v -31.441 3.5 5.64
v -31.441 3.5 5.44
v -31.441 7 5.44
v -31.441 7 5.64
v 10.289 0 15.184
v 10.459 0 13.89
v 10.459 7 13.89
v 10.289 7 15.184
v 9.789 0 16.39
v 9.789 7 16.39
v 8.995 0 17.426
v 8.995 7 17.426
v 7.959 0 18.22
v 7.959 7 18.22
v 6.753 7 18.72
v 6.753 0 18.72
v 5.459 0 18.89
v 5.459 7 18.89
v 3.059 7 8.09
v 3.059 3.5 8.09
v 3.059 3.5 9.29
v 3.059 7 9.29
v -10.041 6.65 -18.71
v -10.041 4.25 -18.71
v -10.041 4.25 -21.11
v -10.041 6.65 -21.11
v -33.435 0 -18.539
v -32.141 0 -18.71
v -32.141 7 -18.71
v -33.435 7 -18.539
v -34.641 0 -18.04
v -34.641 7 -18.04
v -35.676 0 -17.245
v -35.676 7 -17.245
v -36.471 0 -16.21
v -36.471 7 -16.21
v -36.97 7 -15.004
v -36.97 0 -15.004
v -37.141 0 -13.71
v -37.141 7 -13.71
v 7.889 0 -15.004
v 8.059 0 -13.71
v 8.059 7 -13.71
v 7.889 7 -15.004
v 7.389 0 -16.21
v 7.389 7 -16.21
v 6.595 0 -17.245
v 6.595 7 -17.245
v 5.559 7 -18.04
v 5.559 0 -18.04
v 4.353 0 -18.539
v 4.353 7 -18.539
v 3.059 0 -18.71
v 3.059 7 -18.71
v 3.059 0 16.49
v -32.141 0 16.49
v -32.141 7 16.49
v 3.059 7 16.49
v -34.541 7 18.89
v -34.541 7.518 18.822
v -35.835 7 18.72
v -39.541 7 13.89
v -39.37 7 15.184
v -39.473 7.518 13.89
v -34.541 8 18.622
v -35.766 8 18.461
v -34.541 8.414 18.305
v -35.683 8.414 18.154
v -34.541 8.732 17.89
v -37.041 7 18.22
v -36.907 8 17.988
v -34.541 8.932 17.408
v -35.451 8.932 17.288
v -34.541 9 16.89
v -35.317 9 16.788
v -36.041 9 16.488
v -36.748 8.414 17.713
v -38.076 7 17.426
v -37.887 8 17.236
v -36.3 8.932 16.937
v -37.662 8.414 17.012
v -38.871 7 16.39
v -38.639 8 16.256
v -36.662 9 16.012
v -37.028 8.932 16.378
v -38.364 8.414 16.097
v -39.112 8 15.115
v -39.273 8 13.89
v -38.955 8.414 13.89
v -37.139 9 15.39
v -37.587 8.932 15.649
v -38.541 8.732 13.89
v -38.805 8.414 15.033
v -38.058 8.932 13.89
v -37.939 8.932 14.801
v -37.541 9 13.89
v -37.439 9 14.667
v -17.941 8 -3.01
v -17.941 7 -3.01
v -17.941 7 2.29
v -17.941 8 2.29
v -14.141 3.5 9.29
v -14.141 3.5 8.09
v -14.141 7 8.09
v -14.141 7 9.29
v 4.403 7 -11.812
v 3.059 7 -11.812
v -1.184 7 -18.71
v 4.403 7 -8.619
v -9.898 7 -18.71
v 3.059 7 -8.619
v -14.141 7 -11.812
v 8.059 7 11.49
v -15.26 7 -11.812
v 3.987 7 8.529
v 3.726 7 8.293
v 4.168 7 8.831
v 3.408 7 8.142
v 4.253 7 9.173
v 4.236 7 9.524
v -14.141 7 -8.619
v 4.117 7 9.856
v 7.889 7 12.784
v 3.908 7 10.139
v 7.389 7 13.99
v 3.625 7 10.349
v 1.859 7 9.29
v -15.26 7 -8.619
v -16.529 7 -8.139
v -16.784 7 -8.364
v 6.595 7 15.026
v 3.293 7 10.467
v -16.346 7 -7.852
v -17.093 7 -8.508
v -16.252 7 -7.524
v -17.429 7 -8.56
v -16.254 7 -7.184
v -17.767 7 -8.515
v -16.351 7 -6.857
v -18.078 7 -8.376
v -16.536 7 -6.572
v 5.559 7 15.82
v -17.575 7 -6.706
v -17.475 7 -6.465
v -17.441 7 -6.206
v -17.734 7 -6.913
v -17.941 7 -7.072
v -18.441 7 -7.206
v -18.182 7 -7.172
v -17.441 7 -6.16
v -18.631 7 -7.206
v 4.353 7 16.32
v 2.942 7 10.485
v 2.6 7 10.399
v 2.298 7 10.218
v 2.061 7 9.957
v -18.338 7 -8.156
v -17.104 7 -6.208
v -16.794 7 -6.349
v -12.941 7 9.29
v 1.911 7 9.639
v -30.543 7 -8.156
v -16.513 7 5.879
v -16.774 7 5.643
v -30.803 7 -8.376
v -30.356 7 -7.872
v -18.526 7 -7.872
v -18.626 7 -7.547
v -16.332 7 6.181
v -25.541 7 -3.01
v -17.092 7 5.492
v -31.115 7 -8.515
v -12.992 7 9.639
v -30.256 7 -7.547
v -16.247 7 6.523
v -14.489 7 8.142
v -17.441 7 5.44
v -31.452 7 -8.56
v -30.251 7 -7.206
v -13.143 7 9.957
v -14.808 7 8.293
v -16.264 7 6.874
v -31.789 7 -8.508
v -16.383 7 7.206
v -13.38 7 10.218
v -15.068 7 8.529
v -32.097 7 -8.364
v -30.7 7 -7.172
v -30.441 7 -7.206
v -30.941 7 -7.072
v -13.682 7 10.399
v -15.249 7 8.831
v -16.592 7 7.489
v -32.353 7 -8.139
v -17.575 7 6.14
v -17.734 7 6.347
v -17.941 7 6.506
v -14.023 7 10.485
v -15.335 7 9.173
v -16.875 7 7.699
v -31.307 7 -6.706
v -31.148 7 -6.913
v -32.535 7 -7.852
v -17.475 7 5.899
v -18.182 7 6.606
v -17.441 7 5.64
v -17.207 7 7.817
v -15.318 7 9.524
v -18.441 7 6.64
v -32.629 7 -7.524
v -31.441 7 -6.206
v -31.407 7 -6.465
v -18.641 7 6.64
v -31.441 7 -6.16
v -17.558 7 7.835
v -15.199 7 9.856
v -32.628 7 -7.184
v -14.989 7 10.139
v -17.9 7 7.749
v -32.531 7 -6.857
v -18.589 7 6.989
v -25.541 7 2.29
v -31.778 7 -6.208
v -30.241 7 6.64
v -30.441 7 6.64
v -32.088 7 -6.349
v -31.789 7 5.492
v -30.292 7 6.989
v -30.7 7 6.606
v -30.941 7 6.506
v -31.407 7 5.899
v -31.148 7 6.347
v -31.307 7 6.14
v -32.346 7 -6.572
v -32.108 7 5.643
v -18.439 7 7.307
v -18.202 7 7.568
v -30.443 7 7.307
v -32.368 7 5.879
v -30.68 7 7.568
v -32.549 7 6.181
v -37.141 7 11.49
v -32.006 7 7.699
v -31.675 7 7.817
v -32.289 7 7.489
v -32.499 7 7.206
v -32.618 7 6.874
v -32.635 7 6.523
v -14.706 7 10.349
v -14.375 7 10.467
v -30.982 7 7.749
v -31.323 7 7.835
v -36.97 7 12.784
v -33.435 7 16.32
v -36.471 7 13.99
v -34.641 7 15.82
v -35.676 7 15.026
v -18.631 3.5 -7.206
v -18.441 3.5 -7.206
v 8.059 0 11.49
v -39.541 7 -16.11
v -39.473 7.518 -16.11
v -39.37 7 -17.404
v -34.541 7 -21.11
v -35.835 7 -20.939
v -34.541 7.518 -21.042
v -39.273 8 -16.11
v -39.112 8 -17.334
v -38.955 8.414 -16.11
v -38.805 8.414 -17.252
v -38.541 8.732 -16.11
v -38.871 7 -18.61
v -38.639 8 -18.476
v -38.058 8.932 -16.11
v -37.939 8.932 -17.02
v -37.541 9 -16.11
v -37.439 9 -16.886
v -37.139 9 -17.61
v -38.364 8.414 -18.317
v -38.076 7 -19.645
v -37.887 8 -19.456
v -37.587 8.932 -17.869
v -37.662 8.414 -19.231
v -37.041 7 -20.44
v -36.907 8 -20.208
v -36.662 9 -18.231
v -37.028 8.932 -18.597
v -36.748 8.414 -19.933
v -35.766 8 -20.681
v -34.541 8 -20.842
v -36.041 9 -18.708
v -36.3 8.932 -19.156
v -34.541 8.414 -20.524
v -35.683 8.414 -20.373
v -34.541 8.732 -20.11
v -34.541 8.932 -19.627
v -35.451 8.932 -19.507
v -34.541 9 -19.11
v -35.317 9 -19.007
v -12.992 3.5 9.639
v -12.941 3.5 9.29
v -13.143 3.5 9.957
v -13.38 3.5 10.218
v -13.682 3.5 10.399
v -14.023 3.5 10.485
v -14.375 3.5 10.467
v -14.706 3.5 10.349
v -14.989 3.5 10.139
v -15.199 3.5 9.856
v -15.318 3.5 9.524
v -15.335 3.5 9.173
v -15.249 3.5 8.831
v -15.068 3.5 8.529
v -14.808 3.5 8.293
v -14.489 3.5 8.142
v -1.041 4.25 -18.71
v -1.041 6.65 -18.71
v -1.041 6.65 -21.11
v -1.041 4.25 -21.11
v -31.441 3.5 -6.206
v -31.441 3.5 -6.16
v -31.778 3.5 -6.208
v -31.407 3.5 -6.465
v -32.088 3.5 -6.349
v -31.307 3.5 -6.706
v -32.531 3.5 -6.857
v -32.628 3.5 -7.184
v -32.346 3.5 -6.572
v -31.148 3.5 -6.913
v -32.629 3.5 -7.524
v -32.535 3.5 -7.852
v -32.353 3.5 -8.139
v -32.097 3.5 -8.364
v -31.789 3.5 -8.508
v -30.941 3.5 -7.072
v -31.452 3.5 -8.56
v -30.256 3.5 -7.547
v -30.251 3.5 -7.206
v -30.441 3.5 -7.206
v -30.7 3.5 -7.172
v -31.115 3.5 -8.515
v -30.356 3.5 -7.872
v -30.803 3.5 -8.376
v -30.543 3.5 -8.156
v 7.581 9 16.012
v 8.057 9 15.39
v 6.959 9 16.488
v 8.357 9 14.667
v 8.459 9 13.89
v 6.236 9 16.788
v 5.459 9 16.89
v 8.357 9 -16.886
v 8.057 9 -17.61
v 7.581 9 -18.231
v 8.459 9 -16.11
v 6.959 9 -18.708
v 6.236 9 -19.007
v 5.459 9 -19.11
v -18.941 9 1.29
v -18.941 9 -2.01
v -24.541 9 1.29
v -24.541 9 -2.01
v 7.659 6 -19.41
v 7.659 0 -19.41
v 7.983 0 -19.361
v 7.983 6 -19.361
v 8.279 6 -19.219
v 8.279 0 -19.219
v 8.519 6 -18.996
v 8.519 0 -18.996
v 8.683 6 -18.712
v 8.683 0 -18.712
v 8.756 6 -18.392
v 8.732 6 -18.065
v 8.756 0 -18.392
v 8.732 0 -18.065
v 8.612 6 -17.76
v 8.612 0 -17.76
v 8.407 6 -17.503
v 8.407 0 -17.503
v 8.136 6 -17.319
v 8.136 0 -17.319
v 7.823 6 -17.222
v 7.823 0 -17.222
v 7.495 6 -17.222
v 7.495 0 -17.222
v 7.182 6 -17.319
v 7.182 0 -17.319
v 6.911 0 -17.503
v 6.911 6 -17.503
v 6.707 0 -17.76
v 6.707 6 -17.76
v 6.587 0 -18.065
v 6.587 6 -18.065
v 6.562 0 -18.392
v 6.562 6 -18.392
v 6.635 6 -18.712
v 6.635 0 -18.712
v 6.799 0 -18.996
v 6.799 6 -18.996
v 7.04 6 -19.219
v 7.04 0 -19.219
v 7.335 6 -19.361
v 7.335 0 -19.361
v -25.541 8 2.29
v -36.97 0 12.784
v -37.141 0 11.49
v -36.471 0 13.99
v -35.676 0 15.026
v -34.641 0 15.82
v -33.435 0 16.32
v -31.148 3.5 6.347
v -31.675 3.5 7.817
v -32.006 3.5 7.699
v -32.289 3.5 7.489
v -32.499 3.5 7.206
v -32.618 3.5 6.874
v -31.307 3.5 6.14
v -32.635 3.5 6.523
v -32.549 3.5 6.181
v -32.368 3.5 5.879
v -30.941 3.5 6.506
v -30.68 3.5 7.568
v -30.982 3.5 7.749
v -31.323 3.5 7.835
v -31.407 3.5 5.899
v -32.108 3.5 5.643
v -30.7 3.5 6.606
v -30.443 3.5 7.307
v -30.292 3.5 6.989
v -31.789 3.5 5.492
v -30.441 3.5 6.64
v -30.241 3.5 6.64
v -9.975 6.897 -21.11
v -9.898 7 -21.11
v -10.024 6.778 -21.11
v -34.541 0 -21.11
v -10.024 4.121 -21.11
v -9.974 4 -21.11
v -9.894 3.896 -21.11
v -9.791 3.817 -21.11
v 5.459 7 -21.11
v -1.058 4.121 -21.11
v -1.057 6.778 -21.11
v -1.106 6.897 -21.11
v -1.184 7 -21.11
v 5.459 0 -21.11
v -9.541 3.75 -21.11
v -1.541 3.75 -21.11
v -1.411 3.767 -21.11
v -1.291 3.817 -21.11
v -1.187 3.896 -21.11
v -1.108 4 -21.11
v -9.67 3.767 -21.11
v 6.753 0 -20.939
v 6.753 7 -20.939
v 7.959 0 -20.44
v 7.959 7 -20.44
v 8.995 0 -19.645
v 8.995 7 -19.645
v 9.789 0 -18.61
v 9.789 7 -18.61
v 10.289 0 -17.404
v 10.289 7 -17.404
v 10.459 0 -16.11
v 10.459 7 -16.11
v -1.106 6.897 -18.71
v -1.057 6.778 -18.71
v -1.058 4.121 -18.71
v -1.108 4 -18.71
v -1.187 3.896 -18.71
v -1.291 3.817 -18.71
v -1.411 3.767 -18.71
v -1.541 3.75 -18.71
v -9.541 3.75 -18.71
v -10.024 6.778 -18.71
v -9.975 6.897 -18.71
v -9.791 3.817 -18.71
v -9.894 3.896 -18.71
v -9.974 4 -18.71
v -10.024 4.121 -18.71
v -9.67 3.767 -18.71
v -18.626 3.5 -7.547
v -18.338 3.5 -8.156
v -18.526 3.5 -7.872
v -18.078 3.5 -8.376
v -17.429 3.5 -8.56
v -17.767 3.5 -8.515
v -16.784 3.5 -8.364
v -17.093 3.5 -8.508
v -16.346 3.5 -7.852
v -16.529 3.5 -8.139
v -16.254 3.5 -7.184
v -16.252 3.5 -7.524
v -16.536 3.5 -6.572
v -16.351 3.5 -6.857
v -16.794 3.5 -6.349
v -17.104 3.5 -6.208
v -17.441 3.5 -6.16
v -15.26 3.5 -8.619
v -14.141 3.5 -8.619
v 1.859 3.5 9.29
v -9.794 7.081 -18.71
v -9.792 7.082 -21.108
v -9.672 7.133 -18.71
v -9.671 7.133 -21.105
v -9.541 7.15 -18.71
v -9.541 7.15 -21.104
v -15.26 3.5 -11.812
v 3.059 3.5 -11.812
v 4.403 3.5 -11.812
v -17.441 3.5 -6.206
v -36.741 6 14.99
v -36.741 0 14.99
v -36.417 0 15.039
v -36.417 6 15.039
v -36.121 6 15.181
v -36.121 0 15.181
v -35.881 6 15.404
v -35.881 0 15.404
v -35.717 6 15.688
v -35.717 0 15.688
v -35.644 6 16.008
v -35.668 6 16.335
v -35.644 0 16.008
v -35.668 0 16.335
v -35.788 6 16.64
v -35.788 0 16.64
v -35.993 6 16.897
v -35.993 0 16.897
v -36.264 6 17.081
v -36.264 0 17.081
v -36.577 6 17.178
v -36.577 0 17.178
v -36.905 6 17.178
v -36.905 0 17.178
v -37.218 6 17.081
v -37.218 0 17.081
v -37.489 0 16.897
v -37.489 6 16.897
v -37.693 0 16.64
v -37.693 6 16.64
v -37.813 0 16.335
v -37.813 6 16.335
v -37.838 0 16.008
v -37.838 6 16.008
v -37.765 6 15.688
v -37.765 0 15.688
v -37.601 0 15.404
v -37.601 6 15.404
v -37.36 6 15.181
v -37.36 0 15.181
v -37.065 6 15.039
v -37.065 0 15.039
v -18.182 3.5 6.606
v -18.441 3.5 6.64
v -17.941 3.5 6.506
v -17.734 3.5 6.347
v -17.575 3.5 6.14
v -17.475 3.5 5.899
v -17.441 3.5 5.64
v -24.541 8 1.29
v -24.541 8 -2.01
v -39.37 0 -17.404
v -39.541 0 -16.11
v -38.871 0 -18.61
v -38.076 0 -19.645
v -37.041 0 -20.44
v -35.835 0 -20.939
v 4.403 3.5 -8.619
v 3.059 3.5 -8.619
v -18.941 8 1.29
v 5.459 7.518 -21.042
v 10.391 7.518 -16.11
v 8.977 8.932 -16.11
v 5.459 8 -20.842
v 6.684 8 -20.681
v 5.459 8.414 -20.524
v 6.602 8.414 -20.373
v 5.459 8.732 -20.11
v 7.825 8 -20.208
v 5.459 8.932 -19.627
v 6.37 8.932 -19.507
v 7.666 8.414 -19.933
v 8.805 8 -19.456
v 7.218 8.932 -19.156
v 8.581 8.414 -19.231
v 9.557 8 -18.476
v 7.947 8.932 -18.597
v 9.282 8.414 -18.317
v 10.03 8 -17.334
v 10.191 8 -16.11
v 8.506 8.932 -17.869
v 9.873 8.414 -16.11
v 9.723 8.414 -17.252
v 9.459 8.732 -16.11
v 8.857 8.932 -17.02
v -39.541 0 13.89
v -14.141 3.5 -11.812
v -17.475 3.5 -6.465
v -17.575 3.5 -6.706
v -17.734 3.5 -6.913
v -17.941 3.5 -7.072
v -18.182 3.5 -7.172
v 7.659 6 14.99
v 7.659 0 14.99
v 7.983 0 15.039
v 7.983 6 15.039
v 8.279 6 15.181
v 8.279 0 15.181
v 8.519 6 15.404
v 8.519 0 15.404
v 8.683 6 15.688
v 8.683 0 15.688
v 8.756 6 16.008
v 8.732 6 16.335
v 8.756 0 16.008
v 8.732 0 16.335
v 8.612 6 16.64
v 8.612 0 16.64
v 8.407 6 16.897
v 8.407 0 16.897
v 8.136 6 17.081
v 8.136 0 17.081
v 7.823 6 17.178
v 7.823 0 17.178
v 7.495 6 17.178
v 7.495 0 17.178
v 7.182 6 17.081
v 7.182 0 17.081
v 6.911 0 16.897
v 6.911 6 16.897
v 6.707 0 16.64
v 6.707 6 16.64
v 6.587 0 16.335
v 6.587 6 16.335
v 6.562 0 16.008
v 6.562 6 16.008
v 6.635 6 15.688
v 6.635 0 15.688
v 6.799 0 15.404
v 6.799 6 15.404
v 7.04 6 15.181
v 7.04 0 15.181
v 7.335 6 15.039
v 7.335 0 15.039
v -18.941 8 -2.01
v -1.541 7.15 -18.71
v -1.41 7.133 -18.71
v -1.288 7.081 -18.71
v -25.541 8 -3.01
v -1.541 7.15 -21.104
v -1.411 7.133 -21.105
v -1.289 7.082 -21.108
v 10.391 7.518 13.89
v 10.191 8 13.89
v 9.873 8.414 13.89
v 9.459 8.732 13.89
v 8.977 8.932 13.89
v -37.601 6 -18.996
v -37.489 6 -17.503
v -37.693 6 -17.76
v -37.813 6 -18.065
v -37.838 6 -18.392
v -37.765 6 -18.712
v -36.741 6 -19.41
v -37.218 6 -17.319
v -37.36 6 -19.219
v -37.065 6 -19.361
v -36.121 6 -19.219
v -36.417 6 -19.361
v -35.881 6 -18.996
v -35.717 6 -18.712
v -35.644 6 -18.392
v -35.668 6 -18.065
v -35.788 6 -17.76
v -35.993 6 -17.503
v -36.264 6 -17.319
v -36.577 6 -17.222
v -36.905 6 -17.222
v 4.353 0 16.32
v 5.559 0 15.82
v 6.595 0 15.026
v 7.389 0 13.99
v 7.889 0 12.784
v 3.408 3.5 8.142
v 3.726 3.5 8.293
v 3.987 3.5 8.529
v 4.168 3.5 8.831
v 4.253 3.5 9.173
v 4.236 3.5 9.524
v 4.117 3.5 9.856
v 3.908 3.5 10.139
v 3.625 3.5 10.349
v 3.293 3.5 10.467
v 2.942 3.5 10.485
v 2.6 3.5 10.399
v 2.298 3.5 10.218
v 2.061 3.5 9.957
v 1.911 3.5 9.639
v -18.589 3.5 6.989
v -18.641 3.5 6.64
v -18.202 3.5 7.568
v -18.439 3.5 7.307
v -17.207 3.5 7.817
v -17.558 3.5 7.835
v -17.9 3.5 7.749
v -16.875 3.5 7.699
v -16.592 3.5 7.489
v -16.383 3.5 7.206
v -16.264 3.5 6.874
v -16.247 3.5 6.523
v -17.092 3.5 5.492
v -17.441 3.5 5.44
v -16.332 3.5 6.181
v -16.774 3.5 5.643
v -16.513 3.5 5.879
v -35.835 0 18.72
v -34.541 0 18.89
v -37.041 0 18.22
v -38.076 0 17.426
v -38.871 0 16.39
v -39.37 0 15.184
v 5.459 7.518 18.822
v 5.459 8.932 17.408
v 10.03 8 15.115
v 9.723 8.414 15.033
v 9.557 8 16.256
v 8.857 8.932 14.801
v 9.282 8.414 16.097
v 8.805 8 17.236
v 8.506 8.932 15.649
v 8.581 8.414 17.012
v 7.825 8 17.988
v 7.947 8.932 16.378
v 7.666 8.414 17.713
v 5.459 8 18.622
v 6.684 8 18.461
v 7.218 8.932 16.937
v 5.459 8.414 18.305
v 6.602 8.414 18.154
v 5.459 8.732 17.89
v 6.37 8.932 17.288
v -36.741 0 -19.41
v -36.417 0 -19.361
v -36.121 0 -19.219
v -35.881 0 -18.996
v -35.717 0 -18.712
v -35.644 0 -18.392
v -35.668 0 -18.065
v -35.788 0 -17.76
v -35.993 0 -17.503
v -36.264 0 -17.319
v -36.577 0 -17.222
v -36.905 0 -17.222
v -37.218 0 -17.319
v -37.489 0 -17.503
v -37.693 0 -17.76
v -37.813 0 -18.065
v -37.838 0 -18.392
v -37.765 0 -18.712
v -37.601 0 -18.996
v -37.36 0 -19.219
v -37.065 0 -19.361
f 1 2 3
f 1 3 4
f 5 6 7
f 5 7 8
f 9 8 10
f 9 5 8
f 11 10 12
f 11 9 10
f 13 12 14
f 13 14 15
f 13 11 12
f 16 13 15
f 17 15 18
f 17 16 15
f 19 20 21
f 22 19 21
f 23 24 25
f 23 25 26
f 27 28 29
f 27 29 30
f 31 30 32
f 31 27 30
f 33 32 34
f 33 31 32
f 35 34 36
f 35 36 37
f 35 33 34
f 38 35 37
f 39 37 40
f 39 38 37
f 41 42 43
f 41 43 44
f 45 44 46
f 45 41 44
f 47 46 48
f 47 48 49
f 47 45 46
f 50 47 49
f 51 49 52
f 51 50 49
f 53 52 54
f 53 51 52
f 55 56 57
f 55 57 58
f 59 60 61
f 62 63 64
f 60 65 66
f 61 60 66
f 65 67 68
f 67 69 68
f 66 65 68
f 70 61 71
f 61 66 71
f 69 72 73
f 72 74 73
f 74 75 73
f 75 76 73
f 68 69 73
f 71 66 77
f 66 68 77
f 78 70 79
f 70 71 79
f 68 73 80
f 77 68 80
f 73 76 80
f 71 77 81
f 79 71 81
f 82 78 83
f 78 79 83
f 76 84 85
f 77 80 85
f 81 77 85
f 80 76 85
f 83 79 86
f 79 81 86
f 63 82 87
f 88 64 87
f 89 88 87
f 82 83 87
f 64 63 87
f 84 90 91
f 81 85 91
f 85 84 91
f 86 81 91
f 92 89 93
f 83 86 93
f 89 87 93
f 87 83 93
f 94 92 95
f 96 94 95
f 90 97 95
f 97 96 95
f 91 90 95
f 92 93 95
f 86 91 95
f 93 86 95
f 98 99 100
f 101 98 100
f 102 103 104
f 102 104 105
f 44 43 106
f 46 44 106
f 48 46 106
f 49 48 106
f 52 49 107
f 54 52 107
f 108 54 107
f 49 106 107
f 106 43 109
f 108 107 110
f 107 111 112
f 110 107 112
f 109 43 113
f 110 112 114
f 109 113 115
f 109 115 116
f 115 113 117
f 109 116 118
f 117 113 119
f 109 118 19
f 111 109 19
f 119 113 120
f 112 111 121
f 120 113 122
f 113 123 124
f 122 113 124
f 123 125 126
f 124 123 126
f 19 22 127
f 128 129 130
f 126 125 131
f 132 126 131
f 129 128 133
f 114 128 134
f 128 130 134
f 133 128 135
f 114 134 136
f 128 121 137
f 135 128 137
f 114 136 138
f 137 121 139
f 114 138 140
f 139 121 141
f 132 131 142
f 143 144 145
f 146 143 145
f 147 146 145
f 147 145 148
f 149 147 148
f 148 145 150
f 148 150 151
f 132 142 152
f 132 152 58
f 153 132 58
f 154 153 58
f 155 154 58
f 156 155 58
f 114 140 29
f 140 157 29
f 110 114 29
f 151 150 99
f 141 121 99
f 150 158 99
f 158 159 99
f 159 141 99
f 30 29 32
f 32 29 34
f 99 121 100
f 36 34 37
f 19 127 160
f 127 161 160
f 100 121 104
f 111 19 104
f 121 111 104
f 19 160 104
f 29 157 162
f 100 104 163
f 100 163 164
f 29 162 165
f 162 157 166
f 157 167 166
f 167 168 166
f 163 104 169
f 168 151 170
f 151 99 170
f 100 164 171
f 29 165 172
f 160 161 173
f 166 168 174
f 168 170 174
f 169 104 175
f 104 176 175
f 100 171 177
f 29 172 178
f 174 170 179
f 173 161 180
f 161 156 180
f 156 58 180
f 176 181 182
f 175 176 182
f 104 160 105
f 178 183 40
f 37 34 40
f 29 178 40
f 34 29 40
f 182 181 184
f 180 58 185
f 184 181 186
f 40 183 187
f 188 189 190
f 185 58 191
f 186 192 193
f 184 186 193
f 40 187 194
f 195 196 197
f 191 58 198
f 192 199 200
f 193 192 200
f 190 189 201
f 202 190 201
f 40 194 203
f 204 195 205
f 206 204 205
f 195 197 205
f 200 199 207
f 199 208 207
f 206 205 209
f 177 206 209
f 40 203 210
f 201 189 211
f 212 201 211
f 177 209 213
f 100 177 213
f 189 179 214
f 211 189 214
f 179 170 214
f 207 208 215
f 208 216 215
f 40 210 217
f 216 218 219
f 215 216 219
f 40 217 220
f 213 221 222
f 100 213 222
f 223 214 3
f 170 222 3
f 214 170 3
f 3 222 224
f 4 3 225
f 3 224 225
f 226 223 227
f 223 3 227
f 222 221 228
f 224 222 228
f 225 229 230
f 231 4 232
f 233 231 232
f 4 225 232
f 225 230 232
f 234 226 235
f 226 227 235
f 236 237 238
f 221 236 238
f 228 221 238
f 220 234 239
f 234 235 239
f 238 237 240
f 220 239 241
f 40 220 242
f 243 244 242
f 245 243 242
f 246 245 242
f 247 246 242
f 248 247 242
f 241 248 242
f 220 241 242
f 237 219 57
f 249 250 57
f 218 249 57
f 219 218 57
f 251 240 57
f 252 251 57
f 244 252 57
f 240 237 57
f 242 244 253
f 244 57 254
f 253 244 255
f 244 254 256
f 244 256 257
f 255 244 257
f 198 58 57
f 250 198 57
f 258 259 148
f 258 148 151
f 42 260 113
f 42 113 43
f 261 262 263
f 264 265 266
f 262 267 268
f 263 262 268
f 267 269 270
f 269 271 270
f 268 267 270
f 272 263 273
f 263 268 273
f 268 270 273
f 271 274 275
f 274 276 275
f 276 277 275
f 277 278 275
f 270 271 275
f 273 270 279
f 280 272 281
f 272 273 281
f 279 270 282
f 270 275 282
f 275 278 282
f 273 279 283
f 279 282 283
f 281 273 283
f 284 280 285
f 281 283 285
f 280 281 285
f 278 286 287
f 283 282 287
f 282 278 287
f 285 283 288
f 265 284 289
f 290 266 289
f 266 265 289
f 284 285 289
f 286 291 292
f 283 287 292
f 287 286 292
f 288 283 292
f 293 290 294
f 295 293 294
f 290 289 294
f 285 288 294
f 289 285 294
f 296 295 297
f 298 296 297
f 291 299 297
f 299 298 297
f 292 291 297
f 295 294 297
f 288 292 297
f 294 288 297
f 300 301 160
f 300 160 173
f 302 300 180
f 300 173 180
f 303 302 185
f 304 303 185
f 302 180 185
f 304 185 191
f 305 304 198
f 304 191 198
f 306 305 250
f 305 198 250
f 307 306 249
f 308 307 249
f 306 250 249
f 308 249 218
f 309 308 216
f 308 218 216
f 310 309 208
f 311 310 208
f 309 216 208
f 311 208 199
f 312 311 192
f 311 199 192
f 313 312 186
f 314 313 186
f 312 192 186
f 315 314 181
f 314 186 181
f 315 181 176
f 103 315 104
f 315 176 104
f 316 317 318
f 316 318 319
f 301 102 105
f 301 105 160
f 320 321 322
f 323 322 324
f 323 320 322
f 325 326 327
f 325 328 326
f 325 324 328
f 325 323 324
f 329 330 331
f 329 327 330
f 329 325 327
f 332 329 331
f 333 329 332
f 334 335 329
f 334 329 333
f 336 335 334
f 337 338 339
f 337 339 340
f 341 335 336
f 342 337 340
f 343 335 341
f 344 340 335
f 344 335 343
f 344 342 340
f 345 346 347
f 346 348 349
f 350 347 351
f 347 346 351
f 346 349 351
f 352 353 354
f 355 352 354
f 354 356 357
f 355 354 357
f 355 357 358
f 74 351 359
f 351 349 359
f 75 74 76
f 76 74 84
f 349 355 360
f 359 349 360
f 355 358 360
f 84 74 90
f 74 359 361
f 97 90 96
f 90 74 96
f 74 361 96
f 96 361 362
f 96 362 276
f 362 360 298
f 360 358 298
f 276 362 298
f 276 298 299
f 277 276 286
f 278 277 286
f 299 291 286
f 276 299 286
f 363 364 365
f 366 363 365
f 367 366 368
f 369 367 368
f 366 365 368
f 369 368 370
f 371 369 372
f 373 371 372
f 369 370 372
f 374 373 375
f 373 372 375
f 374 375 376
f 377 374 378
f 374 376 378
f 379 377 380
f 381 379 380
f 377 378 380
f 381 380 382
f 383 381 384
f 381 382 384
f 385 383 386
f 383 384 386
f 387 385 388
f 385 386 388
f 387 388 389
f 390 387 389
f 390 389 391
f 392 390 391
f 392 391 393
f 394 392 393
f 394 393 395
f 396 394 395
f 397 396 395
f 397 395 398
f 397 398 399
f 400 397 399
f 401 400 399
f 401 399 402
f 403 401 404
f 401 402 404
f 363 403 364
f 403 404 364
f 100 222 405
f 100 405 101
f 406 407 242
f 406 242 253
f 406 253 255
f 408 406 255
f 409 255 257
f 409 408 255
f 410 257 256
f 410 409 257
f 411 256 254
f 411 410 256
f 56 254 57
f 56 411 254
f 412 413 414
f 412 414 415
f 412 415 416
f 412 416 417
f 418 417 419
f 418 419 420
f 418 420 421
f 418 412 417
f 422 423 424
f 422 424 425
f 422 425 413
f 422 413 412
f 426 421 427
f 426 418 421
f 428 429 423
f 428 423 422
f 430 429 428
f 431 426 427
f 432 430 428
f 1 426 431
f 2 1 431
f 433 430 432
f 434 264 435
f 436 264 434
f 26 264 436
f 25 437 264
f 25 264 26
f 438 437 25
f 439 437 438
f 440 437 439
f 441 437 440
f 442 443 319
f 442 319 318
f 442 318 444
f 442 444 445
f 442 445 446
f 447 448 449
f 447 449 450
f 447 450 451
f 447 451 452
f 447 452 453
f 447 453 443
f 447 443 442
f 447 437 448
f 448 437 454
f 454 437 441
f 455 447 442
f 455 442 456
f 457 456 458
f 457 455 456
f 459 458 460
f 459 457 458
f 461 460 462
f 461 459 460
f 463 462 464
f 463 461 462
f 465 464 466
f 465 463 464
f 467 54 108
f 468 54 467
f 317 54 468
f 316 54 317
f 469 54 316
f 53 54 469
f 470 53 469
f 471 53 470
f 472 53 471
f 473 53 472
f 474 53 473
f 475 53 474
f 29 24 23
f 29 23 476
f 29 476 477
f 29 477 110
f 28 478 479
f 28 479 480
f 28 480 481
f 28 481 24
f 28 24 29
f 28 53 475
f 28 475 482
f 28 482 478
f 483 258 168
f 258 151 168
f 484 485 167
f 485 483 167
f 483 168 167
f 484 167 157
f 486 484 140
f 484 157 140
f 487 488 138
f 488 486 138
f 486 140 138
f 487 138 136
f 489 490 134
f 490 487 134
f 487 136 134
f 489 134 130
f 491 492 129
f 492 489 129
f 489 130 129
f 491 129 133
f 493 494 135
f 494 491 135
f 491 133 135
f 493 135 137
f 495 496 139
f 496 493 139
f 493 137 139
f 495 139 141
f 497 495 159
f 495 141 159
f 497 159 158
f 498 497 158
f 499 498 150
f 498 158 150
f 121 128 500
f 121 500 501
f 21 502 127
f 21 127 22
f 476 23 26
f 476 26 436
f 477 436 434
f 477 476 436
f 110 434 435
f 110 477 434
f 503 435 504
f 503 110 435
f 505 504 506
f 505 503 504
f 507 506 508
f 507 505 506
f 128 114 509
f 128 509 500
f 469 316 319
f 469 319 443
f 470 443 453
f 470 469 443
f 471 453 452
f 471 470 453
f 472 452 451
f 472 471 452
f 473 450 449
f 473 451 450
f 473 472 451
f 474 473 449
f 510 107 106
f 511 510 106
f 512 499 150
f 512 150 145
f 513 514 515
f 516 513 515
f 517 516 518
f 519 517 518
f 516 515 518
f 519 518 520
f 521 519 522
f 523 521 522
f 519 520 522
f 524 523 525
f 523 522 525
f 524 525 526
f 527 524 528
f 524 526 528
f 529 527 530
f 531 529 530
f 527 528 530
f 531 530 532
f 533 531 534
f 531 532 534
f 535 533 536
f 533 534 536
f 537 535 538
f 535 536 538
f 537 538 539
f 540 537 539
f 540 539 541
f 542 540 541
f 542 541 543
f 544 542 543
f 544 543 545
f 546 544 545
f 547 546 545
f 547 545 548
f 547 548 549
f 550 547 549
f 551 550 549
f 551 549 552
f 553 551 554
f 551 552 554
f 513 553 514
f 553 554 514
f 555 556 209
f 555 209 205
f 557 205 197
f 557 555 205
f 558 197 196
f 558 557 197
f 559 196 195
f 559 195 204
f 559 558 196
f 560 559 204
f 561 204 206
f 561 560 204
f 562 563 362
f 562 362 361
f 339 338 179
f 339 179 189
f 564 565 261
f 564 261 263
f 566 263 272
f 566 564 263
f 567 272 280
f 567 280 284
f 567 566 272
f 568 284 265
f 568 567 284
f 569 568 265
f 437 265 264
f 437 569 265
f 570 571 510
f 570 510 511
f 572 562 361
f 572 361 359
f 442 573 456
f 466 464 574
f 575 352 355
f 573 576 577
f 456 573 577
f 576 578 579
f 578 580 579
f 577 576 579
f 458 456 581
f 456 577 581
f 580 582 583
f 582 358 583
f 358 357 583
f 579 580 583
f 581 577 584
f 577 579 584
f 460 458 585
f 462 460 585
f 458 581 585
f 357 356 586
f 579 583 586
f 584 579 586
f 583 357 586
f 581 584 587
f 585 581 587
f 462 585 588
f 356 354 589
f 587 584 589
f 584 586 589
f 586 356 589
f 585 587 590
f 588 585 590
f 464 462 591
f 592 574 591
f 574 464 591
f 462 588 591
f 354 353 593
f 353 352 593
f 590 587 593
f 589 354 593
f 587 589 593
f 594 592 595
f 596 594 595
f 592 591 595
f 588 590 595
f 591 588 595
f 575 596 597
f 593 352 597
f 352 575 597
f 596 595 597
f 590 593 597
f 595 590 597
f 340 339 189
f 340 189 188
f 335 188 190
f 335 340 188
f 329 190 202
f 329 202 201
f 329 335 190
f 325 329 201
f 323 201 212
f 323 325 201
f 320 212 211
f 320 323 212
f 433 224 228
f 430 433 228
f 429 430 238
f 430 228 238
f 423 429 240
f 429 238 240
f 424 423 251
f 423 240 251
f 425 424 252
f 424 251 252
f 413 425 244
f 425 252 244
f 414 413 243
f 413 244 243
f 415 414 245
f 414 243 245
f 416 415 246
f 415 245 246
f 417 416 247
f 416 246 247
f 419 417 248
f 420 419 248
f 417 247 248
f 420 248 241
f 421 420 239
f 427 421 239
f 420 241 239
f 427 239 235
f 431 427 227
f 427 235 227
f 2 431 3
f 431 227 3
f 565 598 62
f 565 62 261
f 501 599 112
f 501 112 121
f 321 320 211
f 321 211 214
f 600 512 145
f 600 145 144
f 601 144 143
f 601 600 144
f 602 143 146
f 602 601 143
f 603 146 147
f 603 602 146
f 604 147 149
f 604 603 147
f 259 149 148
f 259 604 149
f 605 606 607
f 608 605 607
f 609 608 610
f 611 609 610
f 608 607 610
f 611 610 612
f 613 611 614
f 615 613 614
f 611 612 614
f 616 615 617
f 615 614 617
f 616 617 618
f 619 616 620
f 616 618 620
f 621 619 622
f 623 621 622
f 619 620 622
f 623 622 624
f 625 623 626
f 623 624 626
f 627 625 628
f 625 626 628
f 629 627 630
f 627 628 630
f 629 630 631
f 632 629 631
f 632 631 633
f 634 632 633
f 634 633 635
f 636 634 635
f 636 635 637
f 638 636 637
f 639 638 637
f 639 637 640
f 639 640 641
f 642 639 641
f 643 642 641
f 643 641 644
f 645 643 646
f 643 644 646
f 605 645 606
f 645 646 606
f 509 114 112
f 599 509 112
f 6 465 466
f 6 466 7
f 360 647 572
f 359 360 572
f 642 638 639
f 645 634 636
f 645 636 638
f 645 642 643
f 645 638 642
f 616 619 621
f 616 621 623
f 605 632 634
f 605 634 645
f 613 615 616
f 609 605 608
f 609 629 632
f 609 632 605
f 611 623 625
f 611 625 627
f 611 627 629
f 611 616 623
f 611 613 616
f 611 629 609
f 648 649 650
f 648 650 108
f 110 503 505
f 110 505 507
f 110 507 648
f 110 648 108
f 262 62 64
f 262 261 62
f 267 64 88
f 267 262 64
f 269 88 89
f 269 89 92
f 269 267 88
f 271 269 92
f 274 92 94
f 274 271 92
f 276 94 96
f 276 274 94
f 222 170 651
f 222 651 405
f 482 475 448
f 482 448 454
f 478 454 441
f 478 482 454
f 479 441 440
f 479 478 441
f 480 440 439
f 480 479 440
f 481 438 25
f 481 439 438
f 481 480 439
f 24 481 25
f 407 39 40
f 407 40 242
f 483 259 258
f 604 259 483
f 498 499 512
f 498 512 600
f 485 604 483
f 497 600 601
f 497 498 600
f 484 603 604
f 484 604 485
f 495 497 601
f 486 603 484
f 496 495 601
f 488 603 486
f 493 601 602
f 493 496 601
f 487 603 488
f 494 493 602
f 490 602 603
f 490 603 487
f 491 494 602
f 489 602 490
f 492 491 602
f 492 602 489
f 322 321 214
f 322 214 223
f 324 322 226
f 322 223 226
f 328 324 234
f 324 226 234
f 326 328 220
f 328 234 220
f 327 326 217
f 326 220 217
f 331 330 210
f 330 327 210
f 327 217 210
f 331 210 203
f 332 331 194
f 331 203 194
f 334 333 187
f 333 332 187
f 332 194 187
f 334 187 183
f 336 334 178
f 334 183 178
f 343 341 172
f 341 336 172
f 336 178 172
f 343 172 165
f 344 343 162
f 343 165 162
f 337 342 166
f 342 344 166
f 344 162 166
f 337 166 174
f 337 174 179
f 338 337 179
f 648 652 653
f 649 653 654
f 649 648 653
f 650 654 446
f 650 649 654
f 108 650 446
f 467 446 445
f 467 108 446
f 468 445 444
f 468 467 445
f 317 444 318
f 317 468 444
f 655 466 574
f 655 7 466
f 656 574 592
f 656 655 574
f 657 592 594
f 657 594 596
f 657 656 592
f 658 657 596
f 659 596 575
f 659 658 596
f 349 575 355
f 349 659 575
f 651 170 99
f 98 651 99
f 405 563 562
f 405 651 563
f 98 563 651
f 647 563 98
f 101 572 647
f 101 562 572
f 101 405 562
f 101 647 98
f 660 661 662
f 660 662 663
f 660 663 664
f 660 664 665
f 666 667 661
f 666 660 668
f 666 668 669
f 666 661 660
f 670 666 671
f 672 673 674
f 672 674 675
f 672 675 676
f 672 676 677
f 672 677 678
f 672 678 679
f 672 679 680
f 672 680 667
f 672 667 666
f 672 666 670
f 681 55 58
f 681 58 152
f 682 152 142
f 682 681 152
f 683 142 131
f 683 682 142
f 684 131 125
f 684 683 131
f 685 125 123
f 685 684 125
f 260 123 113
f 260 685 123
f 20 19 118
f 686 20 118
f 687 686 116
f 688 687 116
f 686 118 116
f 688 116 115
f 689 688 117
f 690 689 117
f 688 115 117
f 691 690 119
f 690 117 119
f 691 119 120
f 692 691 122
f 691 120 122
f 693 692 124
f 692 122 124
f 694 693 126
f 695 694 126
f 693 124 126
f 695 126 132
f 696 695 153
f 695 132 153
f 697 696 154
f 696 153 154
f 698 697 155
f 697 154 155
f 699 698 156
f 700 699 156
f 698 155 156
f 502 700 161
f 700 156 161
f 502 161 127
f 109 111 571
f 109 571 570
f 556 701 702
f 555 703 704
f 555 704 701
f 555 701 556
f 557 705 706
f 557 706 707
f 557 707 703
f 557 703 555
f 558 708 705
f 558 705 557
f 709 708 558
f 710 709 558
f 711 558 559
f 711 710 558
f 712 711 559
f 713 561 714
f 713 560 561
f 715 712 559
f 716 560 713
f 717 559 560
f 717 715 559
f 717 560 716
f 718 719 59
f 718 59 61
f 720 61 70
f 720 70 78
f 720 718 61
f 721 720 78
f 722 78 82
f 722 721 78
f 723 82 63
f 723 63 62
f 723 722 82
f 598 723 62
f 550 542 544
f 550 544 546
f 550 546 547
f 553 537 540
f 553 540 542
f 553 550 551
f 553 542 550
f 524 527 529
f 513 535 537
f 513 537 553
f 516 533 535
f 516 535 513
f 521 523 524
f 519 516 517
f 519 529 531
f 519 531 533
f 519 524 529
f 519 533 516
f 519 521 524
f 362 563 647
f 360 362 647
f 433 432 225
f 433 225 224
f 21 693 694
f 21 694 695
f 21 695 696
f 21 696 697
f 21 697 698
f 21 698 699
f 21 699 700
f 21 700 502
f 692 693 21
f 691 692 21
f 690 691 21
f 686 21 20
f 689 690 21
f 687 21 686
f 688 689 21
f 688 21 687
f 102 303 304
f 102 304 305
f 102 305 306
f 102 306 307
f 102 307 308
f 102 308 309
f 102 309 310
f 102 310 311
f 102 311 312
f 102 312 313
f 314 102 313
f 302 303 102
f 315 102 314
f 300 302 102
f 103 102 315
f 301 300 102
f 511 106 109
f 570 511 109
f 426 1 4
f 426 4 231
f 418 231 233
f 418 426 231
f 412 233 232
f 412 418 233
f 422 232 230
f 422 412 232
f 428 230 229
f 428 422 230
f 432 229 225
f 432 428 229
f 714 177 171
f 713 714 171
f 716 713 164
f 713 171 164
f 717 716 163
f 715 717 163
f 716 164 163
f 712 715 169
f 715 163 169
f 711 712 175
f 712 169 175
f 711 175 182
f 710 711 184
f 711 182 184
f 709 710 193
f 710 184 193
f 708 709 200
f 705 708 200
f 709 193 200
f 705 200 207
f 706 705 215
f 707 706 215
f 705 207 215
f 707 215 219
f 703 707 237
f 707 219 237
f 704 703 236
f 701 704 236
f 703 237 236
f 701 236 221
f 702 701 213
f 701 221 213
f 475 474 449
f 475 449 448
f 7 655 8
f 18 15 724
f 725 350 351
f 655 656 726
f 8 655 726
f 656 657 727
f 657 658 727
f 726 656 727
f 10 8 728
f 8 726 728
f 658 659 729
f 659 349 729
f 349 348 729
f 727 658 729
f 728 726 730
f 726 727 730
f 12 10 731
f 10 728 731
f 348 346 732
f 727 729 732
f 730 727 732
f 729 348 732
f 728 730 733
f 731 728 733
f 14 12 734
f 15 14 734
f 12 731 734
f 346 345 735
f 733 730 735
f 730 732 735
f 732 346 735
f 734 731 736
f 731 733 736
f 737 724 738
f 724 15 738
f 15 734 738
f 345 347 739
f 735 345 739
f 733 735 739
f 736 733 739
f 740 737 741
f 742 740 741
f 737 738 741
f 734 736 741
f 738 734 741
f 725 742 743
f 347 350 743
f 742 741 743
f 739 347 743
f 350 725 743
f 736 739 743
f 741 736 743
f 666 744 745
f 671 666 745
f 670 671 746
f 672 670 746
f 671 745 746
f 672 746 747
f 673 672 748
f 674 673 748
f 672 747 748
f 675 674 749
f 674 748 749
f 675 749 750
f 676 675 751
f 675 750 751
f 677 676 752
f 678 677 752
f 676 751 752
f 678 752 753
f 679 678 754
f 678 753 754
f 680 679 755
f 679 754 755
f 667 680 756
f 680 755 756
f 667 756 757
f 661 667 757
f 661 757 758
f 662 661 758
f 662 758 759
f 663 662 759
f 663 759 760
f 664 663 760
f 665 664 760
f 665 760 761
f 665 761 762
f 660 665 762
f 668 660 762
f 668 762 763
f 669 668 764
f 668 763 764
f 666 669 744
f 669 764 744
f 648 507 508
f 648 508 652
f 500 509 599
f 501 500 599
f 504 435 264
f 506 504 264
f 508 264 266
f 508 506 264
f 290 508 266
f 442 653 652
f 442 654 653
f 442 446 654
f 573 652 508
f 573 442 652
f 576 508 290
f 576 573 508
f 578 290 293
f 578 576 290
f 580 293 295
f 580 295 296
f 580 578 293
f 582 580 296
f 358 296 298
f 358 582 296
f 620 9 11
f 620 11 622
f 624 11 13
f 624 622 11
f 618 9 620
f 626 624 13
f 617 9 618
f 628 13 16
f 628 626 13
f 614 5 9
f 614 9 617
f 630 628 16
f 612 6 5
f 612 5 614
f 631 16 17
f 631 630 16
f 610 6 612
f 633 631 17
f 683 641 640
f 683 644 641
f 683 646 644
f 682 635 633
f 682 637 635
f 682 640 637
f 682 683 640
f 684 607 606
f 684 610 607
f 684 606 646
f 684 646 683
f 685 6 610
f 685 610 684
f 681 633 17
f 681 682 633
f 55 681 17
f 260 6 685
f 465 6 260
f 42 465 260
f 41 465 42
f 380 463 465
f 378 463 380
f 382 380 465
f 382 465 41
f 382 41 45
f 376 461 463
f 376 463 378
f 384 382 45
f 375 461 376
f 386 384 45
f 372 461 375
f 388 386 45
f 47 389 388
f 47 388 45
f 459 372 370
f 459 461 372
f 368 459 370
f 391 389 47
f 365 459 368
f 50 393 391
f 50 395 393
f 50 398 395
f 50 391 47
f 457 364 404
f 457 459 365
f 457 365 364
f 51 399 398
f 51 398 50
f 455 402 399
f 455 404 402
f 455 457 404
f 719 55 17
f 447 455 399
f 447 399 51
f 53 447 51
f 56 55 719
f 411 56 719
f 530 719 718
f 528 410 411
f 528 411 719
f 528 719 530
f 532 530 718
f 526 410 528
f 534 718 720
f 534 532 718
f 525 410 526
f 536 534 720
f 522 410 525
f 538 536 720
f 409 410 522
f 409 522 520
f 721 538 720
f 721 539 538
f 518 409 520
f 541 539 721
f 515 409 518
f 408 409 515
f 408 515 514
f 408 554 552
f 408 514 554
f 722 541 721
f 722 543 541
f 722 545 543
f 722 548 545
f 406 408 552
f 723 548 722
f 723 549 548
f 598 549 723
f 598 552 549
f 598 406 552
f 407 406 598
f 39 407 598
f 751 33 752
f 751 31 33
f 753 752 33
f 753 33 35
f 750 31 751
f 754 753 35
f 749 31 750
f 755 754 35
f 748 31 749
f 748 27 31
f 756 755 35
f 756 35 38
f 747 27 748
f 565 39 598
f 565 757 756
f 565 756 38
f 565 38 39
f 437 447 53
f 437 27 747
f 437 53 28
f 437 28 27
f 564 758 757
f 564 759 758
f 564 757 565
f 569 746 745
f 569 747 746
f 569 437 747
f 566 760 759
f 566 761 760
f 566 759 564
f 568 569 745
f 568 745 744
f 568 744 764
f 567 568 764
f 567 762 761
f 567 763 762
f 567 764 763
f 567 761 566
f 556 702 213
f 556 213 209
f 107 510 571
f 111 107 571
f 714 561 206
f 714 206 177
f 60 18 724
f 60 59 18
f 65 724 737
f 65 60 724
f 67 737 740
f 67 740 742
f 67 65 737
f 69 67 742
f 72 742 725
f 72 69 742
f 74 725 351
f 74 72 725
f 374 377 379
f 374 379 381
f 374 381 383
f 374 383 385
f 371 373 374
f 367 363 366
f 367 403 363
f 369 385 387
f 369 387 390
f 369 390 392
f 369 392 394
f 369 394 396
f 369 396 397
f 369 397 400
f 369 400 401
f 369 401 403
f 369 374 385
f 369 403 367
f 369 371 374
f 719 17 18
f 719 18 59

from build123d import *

# Parameters (mm, degrees)
BOSS_EXTRUDE1_DEPTH = 9
FILLET1_R           = 2
CUT_EXTRUDE1_DEPTH  = 7
SKETCH3_R           = 1.1
CUT_EXTRUDE2_DEPTH  = 6
SKETCH4_W           = 5.6
SKETCH4_H           = 3.3
CUT_EXTRUDE3_DEPTH  = 46.366235587
SKETCH5_W           = 7.6
SKETCH5_H           = 5.3
CUT_EXTRUDE4_DEPTH  = 1
SKETCH6_R           = 1.2
BOSS_EXTRUDE2_DEPTH = 3.5
CUT_EXTRUDE5_DEPTH  = 3.5
SKETCH9_R           = 1.2
SKETCH9_W           = 1.831616398
SKETCH9_H           = 3.192245721
SKETCH9_W_2         = 1.831616397
BOSS_EXTRUDE3_DEPTH = 3.5
SKETCH10_W          = 17.2
SKETCH10_H          = 21.10187295
CUT_EXTRUDE7_DEPTH  = 3.5
CUT_EXTRUDE8_DEPTH  = 3.5


with BuildPart() as part:
    # Sketch1 → Boss-Extrude1 (new body)
    with BuildSketch(Plane(origin=(0, 0, 0), x_dir=(1, 0, 0), z_dir=(0, 1, 0))):
        with BuildLine():
            Line((-34.540816327, 21.109693878), (5.459183673, 21.109693878))
            ThreePointArc((5.459183673, 21.109693878), (8.994717579, 19.645227783), (10.459183673, 16.109693878))
            Line((10.459183673, 16.109693878), (10.459183673, -13.890306122))
            ThreePointArc((10.459183673, -13.890306122), (8.994717579, -17.425840028), (5.459183673, -18.890306122))
            Line((5.459183673, -18.890306122), (-34.540816327, -18.890306122))
            ThreePointArc((-34.540816327, -18.890306122), (-38.076350232, -17.425840028), (-39.540816327, -13.890306122))
            Line((-39.540816327, -13.890306122), (-39.540816327, 16.109693878))
            ThreePointArc((-39.540816327, 16.109693878), (-38.076350232, 19.645227783), (-34.540816327, 21.109693878))
        make_face()
    extrude(amount=BOSS_EXTRUDE1_DEPTH)

    # Fillet1
    fillet1_edges = [part.edges().sort_by_distance(p)[0] for p in [
        (8.994717579, 9, -19.645227783),
        (-14.540816327, 9, -21.109693878),
        (-38.076350232, 9, -19.645227783),
        (-39.540816327, 9, -1.109693878),
        (-38.076350232, 9, 17.425840028),
        (-14.540816327, 9, 18.890306122),
        (8.994717579, 9, 17.425840028),
        (10.459183673, 9, -1.109693878),
    ]]
    fillet(fillet1_edges, radius=FILLET1_R)

    # Sketch2 → Cut-Extrude1 (cut)
    with BuildSketch(Plane.XZ):
        with BuildLine():
            Line((-32.140816327, 16.490306122), (3.059183673, 16.490306122))
            ThreePointArc((3.059183673, 16.490306122), (6.594717579, 15.025840028), (8.059183673, 11.490306122))
            Line((8.059183673, 11.490306122), (8.059183673, -13.709693878))
            ThreePointArc((8.059183673, -13.709693878), (6.594717579, -17.245227783), (3.059183673, -18.709693878))
            Line((3.059183673, -18.709693878), (-32.140816327, -18.709693878))
            ThreePointArc((-32.140816327, -18.709693878), (-35.676350232, -17.245227783), (-37.140816327, -13.709693878))
            Line((-37.140816327, -13.709693878), (-37.140816327, 11.490306122))
            ThreePointArc((-37.140816327, 11.490306122), (-35.676350232, 15.025840028), (-32.140816327, 16.490306122))
        make_face()
    extrude(amount=-CUT_EXTRUDE1_DEPTH, mode=Mode.SUBTRACT)

    # Sketch3 → Cut-Extrude2 (cut)
    with BuildSketch(Plane.XZ):
        with Locations(Location((7.659183673, 16.090306122, 0), (0, 0, 270))):
            Circle(SKETCH3_R)
        with Locations(Location((-36.740816327, 16.090306122, 0), (0, 0, 270))):
            Circle(SKETCH3_R)
        with Locations(Location((-36.740816327, -18.309693878, 0), (0, 0, 270))):
            Circle(SKETCH3_R)
        with Locations(Location((7.659183673, -18.309693878, 0), (0, 0, 270))):
            Circle(SKETCH3_R)
    extrude(amount=-CUT_EXTRUDE2_DEPTH, mode=Mode.SUBTRACT)

    # Sketch4 → Cut-Extrude3 (cut, through all)
    with BuildSketch(Plane.XZ.offset(-7)):
        with Locations((-21.740816327, -0.359693878)):
            Rectangle(SKETCH4_W, SKETCH4_H)
    extrude(amount=-CUT_EXTRUDE3_DEPTH, mode=Mode.SUBTRACT)

    # Sketch5 → Cut-Extrude4 (cut)
    with BuildSketch(Plane.XZ.offset(-7)):
        with Locations((-21.740816327, -0.359693878)):
            Rectangle(SKETCH5_W, SKETCH5_H)
    extrude(amount=-CUT_EXTRUDE4_DEPTH, mode=Mode.SUBTRACT)

    # Sketch6 → Boss-Extrude2 (add)
    with BuildSketch(Plane.XZ.offset(-7)):
        with Locations(Location((-17.440816327, 6.640306122, 0), (0, 0, 270))):
            Circle(SKETCH6_R)
        with Locations(Location((-31.440816327, 6.640306122, 0), (0, 0, 270))):
            Circle(SKETCH6_R)
        with Locations(Location((-31.440816327, -7.359693878, 0), (0, 0, 270))):
            Circle(SKETCH6_R)
        with Locations(Location((-17.440816327, -7.359693878, 0), (0, 0, 270))):
            Circle(SKETCH6_R)
    extrude(amount=BOSS_EXTRUDE2_DEPTH)

    # Sketch7 → Cut-Extrude5 (cut)
    with BuildSketch(Plane.XZ.offset(-3.5)):
        with BuildLine():
            Line((-30.440816327, 6.640306122), (-18.440816327, 6.640306122))
            ThreePointArc((-18.440816327, 6.640306122), (-17.733709545, 6.347412904), (-17.440816327, 5.640306122))
            Line((-17.440816327, 5.640306122), (-17.440816327, -6.206359886))
            ThreePointArc((-17.440816327, -6.206359886), (-17.733709545, -6.913466667), (-18.440816327, -7.206359886))
            Line((-18.440816327, -7.206359886), (-30.440816327, -7.206359886))
            ThreePointArc((-30.440816327, -7.206359886), (-31.147923108, -6.913466667), (-31.440816327, -6.206359886))
            Line((-31.440816327, -6.206359886), (-31.440816327, 5.640306122))
            ThreePointArc((-31.440816327, 5.640306122), (-31.147923108, 6.347412904), (-30.440816327, 6.640306122))
        make_face()
    extrude(amount=-CUT_EXTRUDE5_DEPTH, mode=Mode.SUBTRACT)

    # Sketch9 → Boss-Extrude3 (add)
    with BuildSketch(Plane.XZ.offset(-7)):
        with Locations(Location((3.059183673, 9.290306122, 0), (0, 0, 270))):
            Circle(SKETCH9_R)
        with Locations(Location((-14.140816327, 9.290306122, 0), (0, 0, 270))):
            Circle(SKETCH9_R)
        with Locations((-14.344094184, -10.215443968)):
            Rectangle(SKETCH9_W, SKETCH9_H)
        with Locations((3.487522214, -10.215443968)):
            Rectangle(SKETCH9_W_2, SKETCH9_H)
    extrude(amount=BOSS_EXTRUDE3_DEPTH)

    # Sketch10 → Cut-Extrude7 (cut)
    with BuildSketch(Plane.XZ.offset(-3.5)):
        with Locations((-5.540816327, -1.260630353)):
            Rectangle(SKETCH10_W, SKETCH10_H)
    extrude(amount=-CUT_EXTRUDE7_DEPTH, mode=Mode.SUBTRACT)

    # Sketch11 → Cut-Extrude8 (cut)
    with BuildSketch(Plane.XY.offset(-18.709693878)):
        with BuildLine():
            Line((-9.540816327, 7.15), (-1.540816327, 7.15))
            ThreePointArc((-1.540816327, 7.15), (-1.187262936, 7.003553391), (-1.040816327, 6.65))
            Line((-1.040816327, 6.65), (-1.040816327, 4.25))
            ThreePointArc((-1.040816327, 4.25), (-1.187262936, 3.896446609), (-1.540816327, 3.75))
            Line((-1.540816327, 3.75), (-9.540816327, 3.75))
            ThreePointArc((-9.540816327, 3.75), (-9.894369717, 3.896446609), (-10.040816327, 4.25))
            Line((-10.040816327, 4.25), (-10.040816327, 6.65))
            ThreePointArc((-10.040816327, 6.65), (-9.894369717, 7.003553391), (-9.540816327, 7.15))
        make_face()
    extrude(amount=-CUT_EXTRUDE8_DEPTH, mode=Mode.SUBTRACT)


solid = part.part
